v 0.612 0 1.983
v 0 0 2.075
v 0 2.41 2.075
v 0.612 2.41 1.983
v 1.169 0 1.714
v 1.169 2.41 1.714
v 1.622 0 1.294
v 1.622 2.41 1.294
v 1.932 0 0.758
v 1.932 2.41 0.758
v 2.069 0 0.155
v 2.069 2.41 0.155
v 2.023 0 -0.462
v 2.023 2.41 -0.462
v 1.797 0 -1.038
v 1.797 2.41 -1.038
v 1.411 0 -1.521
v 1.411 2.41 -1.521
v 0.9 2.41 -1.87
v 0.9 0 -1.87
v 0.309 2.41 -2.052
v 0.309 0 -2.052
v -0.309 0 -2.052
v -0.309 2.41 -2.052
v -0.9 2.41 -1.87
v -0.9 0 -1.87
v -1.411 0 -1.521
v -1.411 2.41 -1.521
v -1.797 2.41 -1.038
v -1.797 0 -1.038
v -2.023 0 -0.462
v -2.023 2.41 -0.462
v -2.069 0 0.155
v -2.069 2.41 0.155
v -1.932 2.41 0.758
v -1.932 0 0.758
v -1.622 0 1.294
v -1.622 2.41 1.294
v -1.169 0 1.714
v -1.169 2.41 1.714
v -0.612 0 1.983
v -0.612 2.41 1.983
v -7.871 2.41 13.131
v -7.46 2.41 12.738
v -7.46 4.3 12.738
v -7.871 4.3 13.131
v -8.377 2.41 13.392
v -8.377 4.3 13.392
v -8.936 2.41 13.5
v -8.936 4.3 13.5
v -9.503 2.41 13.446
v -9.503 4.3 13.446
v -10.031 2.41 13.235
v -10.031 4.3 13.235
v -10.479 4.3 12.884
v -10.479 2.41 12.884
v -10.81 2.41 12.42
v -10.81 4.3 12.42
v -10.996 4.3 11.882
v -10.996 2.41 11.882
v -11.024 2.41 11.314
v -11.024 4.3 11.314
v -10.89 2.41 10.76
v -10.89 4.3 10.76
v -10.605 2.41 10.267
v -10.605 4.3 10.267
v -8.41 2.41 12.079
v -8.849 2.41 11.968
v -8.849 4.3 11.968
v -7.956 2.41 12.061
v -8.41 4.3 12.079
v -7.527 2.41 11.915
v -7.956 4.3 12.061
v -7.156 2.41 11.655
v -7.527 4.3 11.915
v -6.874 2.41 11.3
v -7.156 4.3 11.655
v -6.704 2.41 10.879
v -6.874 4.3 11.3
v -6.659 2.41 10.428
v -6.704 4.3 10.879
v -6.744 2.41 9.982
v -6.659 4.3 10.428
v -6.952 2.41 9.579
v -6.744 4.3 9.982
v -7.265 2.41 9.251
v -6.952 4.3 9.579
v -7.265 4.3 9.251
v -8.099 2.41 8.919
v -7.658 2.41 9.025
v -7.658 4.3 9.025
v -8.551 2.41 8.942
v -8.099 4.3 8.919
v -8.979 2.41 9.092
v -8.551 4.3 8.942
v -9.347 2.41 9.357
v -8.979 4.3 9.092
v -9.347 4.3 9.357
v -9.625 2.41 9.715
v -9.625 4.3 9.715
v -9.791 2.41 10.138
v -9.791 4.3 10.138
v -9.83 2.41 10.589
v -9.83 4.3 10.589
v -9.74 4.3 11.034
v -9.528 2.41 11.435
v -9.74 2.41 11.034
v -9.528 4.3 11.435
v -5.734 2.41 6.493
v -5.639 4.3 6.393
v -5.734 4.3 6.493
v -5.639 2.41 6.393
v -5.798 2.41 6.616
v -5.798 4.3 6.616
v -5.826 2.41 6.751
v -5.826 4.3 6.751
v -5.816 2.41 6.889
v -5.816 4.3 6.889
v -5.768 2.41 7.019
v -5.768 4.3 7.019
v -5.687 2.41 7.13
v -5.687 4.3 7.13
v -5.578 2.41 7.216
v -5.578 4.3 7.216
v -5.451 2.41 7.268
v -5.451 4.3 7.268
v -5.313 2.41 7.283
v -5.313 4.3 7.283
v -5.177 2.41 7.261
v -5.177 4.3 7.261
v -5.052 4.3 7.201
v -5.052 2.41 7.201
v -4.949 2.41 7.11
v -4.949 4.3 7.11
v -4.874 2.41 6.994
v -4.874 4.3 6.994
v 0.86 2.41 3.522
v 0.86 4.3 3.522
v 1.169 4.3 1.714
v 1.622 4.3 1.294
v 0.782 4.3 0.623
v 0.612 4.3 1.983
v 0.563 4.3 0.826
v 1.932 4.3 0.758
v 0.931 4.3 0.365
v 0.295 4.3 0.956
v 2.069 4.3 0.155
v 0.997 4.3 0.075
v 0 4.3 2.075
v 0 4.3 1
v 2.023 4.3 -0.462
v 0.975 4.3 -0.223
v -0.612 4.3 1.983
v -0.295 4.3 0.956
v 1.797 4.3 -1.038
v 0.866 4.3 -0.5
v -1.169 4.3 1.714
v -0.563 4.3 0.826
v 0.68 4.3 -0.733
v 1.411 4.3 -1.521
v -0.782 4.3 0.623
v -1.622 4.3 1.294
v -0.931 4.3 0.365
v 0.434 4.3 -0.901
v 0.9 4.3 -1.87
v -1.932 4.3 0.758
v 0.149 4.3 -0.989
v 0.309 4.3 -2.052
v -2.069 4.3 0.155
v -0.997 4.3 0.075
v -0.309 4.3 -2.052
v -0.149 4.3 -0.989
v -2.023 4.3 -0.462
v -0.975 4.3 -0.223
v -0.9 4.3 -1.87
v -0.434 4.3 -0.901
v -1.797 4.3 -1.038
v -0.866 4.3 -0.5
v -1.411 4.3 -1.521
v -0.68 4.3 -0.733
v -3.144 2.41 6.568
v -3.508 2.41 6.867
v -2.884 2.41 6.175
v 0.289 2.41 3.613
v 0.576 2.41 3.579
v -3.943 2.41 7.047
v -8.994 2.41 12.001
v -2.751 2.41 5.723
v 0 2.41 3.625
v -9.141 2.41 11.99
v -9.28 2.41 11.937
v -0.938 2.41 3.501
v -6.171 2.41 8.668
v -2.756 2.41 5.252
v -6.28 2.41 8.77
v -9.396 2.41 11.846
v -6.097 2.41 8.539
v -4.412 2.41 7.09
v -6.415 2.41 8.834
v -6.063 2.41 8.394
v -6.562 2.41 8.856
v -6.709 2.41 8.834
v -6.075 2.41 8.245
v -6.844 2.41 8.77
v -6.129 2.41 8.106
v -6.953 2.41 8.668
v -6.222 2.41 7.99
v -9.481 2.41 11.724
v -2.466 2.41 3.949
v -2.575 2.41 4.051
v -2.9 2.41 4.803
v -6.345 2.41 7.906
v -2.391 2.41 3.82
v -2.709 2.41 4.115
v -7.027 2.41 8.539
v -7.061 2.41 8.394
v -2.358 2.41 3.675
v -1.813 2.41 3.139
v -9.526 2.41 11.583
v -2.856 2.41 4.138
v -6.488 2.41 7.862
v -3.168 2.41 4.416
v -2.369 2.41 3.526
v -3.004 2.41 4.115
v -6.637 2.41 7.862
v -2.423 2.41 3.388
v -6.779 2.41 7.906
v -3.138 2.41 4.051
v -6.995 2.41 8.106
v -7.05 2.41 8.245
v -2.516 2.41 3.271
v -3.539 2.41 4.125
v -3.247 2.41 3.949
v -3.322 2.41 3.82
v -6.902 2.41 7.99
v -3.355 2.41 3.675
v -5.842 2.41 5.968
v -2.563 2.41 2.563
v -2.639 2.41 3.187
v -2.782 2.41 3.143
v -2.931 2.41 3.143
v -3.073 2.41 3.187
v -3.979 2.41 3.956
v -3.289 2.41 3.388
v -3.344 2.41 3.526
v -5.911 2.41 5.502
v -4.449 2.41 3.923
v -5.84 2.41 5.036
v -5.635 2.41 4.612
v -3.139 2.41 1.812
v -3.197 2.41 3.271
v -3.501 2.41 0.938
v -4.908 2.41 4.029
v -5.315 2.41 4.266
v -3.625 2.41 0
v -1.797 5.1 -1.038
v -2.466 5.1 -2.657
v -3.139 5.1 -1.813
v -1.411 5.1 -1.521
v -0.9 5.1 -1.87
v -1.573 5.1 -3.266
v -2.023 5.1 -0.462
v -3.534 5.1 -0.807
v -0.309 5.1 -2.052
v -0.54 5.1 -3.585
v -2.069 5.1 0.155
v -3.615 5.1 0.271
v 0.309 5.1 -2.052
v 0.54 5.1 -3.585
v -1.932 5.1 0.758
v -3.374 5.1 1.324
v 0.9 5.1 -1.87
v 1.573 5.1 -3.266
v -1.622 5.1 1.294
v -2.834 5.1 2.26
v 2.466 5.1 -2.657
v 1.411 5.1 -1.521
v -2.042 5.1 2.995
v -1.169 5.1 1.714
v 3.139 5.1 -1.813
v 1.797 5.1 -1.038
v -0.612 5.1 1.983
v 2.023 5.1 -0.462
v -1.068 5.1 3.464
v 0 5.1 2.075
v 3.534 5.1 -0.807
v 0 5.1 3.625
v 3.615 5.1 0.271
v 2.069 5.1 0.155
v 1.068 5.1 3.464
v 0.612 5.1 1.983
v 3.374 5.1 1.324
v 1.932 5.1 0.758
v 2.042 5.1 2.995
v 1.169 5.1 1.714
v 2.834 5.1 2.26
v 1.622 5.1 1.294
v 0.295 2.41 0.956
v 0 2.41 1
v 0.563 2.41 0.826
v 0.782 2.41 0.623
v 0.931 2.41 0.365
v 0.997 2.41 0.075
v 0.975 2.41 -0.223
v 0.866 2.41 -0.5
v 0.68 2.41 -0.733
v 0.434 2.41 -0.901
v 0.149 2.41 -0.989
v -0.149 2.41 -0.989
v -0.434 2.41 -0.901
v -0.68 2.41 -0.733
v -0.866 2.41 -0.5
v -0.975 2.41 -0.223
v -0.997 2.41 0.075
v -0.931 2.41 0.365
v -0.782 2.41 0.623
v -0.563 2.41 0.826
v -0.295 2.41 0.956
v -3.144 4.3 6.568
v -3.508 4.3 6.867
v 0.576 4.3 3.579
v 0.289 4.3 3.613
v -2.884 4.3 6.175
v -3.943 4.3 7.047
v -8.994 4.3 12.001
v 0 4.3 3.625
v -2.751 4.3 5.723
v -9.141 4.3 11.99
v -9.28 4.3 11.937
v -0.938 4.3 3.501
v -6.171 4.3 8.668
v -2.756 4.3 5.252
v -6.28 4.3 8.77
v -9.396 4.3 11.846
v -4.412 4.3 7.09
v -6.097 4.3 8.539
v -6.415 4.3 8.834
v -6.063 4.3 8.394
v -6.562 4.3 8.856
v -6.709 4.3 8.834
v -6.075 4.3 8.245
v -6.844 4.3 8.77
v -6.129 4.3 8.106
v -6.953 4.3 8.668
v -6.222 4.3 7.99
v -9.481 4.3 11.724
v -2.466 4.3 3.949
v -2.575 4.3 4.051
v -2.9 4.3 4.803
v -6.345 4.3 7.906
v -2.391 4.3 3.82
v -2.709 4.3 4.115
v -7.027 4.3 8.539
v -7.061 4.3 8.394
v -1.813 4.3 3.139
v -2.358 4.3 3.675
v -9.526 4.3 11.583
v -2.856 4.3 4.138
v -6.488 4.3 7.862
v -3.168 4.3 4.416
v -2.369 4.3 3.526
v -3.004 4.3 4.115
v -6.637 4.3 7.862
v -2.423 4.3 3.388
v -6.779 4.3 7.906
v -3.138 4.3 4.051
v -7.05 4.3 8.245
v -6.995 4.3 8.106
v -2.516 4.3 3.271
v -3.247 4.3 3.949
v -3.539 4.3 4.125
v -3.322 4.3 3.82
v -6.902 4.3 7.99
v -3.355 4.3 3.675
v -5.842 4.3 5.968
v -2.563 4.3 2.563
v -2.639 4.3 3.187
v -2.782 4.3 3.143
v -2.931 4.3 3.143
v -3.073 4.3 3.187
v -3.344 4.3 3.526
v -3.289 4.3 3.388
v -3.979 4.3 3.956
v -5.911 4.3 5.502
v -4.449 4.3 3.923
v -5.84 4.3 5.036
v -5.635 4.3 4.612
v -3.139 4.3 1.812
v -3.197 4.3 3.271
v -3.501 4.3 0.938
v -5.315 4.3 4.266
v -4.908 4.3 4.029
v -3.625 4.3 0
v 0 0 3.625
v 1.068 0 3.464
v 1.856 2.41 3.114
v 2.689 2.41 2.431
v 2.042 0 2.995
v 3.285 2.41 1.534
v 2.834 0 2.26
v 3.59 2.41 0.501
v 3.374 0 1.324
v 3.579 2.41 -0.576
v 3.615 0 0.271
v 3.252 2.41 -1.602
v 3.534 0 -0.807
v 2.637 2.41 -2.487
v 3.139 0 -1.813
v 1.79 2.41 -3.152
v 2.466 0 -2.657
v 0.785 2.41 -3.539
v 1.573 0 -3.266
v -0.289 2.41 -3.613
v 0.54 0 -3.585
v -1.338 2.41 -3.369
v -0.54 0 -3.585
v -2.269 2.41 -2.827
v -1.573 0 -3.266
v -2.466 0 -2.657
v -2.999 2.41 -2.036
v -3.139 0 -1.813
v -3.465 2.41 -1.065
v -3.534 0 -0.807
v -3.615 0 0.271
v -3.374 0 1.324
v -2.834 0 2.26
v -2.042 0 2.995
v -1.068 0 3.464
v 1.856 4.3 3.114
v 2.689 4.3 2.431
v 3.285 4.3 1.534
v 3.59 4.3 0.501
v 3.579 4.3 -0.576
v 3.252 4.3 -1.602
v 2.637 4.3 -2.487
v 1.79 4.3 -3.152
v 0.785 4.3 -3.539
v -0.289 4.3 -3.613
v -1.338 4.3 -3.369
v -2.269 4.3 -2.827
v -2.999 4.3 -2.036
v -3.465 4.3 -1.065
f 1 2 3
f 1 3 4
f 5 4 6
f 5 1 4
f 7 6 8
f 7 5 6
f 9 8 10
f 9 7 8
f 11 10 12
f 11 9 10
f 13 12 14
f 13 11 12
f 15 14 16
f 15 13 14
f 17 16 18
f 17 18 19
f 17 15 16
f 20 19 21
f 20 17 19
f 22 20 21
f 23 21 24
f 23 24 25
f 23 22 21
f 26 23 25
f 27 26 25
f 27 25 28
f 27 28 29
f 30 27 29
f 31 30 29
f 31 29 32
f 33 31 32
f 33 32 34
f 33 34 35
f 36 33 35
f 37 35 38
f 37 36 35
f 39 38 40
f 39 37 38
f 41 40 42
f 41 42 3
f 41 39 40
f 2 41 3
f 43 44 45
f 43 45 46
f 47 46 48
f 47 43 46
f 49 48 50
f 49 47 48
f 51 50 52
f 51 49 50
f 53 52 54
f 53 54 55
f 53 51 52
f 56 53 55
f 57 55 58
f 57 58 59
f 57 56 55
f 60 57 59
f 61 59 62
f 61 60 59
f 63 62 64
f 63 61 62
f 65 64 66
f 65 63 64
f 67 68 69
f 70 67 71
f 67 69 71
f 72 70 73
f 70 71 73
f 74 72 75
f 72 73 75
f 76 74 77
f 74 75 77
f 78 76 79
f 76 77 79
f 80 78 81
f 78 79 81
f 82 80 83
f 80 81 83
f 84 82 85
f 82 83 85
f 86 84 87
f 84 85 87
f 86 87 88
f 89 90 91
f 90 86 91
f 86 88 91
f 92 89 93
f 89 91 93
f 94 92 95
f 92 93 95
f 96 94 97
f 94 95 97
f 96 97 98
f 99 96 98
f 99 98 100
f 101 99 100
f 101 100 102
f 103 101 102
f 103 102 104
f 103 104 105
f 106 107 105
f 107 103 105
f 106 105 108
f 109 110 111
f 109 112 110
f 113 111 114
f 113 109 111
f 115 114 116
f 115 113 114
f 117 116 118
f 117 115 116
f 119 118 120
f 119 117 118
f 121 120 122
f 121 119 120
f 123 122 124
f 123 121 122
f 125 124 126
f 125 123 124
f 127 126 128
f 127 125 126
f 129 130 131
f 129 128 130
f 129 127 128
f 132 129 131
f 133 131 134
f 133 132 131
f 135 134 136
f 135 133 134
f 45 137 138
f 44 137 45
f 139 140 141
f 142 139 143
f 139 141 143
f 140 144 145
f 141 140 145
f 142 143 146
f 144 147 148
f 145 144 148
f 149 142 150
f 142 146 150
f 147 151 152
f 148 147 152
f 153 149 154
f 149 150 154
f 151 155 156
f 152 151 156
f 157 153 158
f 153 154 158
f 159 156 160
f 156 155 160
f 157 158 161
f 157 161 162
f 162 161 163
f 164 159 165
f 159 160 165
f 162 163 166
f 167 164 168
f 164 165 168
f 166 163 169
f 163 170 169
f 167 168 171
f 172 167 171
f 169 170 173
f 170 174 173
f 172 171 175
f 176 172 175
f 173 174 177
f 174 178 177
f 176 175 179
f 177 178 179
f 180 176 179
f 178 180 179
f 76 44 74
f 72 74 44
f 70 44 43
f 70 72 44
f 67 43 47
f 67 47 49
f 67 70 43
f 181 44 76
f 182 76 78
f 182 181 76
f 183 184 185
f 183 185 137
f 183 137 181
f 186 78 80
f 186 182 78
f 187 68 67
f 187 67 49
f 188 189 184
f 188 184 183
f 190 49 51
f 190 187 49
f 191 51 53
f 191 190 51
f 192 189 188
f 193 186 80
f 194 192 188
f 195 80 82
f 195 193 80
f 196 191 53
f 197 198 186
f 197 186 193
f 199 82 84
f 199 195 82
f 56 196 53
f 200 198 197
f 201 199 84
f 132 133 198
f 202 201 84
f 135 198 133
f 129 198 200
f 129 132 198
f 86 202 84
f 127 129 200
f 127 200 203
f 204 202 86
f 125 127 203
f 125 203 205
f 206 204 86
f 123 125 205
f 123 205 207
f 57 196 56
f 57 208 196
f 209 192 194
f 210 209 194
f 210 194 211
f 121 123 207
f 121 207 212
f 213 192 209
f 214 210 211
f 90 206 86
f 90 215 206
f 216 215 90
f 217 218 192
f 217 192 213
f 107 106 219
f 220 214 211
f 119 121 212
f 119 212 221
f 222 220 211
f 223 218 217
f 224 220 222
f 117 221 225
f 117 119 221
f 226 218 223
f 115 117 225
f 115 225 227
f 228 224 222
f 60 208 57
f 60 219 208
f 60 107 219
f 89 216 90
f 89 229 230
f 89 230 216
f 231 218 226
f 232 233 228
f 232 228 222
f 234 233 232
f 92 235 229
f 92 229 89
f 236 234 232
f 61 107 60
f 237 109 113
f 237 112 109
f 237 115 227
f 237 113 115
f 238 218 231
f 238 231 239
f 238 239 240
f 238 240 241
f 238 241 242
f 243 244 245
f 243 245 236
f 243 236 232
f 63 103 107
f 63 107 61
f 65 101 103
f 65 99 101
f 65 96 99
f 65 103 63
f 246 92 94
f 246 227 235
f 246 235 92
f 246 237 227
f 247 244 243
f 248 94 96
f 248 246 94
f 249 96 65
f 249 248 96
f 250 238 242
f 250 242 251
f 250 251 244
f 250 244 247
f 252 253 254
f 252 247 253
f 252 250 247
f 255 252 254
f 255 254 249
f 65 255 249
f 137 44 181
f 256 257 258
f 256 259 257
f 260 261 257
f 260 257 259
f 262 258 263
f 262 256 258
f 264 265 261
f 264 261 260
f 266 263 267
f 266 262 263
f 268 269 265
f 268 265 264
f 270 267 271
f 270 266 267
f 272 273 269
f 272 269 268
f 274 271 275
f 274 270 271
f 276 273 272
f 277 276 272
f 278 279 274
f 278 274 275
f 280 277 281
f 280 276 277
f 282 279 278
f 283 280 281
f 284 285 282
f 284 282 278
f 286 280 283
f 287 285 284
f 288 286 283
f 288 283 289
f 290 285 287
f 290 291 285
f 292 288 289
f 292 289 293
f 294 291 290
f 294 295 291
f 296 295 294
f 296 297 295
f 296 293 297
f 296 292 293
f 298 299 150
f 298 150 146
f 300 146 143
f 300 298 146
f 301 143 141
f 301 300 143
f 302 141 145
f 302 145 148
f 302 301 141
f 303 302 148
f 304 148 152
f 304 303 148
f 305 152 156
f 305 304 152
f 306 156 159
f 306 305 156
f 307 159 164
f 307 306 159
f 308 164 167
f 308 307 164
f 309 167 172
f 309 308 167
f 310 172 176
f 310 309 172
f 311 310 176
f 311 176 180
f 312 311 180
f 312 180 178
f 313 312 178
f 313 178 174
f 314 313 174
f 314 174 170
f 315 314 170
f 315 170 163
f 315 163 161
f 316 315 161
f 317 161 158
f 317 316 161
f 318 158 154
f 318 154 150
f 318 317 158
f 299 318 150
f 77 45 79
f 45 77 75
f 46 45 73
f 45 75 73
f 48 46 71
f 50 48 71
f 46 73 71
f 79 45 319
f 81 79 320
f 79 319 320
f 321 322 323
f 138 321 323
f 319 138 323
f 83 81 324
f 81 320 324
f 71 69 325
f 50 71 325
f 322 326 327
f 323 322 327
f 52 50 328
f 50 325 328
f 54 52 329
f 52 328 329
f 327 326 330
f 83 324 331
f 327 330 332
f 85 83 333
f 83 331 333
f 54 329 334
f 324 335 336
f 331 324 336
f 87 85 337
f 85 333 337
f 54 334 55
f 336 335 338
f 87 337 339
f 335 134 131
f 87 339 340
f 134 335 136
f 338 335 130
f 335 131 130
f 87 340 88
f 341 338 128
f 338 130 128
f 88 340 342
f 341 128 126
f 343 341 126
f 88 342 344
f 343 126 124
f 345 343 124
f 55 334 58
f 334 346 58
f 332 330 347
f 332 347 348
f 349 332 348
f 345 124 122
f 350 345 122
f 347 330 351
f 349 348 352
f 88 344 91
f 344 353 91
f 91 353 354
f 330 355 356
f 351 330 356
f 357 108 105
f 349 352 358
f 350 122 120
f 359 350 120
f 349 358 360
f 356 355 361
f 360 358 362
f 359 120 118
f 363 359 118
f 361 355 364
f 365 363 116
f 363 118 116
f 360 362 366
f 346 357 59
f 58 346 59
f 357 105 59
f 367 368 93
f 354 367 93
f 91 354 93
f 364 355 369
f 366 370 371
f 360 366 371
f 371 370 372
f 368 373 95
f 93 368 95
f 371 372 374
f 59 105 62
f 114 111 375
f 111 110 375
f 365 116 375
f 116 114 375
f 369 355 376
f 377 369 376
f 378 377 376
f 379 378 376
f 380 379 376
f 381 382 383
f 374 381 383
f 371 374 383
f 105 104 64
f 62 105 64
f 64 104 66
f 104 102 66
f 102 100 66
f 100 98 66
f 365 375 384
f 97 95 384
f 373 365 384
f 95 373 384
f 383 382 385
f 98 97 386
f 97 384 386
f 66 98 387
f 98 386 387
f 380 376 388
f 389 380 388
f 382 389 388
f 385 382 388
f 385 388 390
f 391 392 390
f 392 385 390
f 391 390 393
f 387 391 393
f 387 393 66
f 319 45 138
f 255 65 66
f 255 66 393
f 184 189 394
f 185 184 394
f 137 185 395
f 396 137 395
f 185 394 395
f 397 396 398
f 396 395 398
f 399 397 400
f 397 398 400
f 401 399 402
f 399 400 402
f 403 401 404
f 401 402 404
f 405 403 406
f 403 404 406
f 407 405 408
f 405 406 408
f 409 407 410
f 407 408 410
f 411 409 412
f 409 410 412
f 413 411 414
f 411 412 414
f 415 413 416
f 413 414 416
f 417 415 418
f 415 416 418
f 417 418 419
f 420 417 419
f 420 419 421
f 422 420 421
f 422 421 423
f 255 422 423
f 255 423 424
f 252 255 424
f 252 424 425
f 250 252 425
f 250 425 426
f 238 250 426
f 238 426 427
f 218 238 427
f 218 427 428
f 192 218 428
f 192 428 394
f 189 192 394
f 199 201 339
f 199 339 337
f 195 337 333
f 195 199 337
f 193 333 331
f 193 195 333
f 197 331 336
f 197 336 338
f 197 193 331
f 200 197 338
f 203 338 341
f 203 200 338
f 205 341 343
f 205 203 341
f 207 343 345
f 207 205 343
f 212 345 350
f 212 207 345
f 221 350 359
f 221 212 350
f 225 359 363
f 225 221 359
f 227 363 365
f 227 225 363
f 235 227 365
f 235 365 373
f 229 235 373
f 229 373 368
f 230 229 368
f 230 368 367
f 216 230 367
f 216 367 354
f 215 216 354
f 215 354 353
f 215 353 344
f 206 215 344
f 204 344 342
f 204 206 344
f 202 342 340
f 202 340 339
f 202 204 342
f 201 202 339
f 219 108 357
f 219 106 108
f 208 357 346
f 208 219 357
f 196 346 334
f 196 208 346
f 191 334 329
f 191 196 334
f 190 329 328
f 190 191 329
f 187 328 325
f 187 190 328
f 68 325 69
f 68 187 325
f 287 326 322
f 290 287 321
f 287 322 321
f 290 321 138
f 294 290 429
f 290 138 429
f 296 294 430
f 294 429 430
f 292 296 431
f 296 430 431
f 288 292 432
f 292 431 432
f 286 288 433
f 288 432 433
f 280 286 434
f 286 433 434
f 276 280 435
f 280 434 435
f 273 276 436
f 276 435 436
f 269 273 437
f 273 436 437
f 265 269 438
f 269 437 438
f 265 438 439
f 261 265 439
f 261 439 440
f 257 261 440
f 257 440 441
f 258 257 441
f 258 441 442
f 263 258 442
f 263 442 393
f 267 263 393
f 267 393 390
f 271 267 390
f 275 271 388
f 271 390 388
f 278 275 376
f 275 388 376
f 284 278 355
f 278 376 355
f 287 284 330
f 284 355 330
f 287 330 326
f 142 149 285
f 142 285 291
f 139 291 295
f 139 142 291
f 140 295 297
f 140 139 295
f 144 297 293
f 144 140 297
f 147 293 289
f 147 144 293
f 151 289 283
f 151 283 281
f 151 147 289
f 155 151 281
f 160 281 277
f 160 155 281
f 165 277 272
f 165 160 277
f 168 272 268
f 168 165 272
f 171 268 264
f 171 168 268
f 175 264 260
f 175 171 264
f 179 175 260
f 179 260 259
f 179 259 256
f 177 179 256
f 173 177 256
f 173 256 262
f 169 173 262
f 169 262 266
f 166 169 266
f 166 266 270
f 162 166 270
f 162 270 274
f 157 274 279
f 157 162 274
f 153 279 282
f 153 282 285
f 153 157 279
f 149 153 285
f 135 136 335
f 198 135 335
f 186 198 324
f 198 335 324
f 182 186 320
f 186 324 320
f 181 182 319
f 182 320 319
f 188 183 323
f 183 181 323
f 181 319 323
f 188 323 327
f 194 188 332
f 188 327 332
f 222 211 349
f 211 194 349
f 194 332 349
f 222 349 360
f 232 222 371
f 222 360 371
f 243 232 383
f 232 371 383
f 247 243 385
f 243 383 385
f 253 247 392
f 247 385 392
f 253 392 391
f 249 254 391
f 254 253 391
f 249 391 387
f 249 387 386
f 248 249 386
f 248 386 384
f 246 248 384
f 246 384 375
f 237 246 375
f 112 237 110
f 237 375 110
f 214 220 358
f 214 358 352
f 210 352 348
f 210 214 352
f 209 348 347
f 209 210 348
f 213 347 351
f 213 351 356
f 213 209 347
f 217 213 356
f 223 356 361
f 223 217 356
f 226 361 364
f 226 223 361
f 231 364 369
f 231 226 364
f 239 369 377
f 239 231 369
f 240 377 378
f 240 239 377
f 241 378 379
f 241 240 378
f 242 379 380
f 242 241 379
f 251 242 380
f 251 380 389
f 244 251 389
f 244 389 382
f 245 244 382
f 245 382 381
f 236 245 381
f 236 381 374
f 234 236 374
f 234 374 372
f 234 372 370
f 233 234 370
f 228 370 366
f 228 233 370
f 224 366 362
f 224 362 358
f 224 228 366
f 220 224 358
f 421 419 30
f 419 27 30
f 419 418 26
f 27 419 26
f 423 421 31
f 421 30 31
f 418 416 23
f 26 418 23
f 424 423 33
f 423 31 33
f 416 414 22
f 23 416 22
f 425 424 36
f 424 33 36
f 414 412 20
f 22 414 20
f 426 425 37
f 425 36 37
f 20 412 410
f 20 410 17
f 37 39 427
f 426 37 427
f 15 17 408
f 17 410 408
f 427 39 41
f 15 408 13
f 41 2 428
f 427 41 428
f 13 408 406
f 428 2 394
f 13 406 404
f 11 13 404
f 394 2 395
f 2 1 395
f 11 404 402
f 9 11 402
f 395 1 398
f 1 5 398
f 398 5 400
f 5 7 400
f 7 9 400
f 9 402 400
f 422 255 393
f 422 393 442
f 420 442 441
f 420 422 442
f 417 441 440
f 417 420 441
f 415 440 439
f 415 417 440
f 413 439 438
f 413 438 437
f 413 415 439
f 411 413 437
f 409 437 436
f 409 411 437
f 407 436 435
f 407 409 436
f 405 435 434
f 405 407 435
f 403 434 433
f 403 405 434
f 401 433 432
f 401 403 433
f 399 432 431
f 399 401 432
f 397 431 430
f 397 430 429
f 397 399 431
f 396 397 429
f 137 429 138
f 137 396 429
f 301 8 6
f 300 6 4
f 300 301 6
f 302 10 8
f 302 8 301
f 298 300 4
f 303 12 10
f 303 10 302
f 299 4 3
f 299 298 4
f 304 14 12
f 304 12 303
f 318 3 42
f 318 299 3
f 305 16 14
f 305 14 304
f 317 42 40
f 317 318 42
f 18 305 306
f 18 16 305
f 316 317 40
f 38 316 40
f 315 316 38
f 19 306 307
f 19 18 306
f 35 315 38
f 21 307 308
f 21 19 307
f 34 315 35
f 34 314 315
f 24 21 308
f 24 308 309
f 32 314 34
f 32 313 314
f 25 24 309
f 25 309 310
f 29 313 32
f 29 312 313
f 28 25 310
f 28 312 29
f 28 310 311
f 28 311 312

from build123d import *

# Parameters (mm, degrees)
SKETCH1_R           = 3.625
SKETCH1_R_2         = 2.075
BOSS_EXTRUDE1_DEPTH = 2.41
SKETCH2_R           = 1
SKETCH2_R_2         = 0.5
BOSS_EXTRUDE3_DEPTH = 1.89
BOSS_EXTRUDE4_START = 4.3
SKETCH1_2_R         = 3.625
SKETCH1_2_R_2       = 2.075
BOSS_EXTRUDE4_DEPTH = 0.8
SKETCH3_R           = 1.5875
CUT_EXTRUDE1_DEPTH  = 18.958844524


with BuildPart() as part:
    # Sketch1 → Boss-Extrude1 (new body)
    with BuildSketch(Plane(origin=(0, 0, 0), x_dir=(1, 0, 0), z_dir=(0, 1, 0))):
        with Locations(Location((0, 0, 0), (0, 0, 270))):
            Circle(SKETCH1_R)
        with Locations(Location((0, 0, 0), (0, 0, 270))):
            Circle(SKETCH1_R_2, mode=Mode.SUBTRACT)
    extrude(amount=BOSS_EXTRUDE1_DEPTH)

    # Sketch2 → Boss-Extrude3 (add)
    with BuildSketch(Plane(origin=(0, 2.41, 0), x_dir=(1, 0, 0), z_dir=(0, 1, 0))):
        with BuildLine():
            Line((-10.6054557, -10.267177528), (-3.625, 0))
            ThreePointArc((-3.625, 0), (2.238819707, 2.851019347), (0.859585555, -3.521610097))
            Line((0.859585555, -3.521610097), (-7.459503317, -12.737599274))
            ThreePointArc((-7.459503317, -12.737599274), (-10.267690381, -13.075364593), (-10.6054557, -10.267177528))
        make_face()
        with Locations(Location((0, 0, 0), (0, 0, 270))):
            Circle(SKETCH2_R, mode=Mode.SUBTRACT)
        with Locations(Location((-9.032479508, -11.502388401, 0), (0, 0, 270))):
            Circle(SKETCH2_R_2, mode=Mode.SUBTRACT)
        with Locations(Location((-7.797268635, -9.92941221, 0), (0, 0, 270))):
            Circle(SKETCH2_R_2, mode=Mode.SUBTRACT)
        with Locations(Location((-6.562057762, -8.356436018, 0), (0, 0, 270))):
            Circle(SKETCH2_R_2, mode=Mode.SUBTRACT)
        with Locations(Location((-5.32684689, -6.783459826, 0), (0, 0, 270))):
            Circle(SKETCH2_R_2, mode=Mode.SUBTRACT)
        with Locations(Location((-4.091636017, -5.210483635, 0), (0, 0, 270))):
            Circle(SKETCH2_R_2, mode=Mode.SUBTRACT)
        with Locations(Location((-2.856425144, -3.637507443, 0), (0, 0, 270))):
            Circle(SKETCH2_R_2, mode=Mode.SUBTRACT)
    extrude(amount=BOSS_EXTRUDE3_DEPTH)

    # Sketch1<2> → Boss-Extrude4 (add)
    with BuildSketch(Plane(origin=(0, 0, 0), x_dir=(1, 0, 0), z_dir=(0, 1, 0)).offset(BOSS_EXTRUDE4_START)):
        with Locations(Location((0, 0, 0), (0, 0, 270))):
            Circle(SKETCH1_2_R)
        with Locations(Location((0, 0, 0), (0, 0, 270))):
            Circle(SKETCH1_2_R_2, mode=Mode.SUBTRACT)
    extrude(amount=BOSS_EXTRUDE4_DEPTH)

    # Sketch3 → Cut-Extrude1 (cut, through all)
    with BuildSketch(Plane(origin=(0, 4.3, 0), x_dir=(1, 0, 0), z_dir=(0, 1, 0))):
        with Locations((-8.245032577, -10.499616079)):
            Circle(SKETCH3_R)
        with Locations((-4.323238055, -5.505416671)):
            Circle(SKETCH3_R)
    extrude(amount=-CUT_EXTRUDE1_DEPTH, mode=Mode.SUBTRACT)


solid = part.part
